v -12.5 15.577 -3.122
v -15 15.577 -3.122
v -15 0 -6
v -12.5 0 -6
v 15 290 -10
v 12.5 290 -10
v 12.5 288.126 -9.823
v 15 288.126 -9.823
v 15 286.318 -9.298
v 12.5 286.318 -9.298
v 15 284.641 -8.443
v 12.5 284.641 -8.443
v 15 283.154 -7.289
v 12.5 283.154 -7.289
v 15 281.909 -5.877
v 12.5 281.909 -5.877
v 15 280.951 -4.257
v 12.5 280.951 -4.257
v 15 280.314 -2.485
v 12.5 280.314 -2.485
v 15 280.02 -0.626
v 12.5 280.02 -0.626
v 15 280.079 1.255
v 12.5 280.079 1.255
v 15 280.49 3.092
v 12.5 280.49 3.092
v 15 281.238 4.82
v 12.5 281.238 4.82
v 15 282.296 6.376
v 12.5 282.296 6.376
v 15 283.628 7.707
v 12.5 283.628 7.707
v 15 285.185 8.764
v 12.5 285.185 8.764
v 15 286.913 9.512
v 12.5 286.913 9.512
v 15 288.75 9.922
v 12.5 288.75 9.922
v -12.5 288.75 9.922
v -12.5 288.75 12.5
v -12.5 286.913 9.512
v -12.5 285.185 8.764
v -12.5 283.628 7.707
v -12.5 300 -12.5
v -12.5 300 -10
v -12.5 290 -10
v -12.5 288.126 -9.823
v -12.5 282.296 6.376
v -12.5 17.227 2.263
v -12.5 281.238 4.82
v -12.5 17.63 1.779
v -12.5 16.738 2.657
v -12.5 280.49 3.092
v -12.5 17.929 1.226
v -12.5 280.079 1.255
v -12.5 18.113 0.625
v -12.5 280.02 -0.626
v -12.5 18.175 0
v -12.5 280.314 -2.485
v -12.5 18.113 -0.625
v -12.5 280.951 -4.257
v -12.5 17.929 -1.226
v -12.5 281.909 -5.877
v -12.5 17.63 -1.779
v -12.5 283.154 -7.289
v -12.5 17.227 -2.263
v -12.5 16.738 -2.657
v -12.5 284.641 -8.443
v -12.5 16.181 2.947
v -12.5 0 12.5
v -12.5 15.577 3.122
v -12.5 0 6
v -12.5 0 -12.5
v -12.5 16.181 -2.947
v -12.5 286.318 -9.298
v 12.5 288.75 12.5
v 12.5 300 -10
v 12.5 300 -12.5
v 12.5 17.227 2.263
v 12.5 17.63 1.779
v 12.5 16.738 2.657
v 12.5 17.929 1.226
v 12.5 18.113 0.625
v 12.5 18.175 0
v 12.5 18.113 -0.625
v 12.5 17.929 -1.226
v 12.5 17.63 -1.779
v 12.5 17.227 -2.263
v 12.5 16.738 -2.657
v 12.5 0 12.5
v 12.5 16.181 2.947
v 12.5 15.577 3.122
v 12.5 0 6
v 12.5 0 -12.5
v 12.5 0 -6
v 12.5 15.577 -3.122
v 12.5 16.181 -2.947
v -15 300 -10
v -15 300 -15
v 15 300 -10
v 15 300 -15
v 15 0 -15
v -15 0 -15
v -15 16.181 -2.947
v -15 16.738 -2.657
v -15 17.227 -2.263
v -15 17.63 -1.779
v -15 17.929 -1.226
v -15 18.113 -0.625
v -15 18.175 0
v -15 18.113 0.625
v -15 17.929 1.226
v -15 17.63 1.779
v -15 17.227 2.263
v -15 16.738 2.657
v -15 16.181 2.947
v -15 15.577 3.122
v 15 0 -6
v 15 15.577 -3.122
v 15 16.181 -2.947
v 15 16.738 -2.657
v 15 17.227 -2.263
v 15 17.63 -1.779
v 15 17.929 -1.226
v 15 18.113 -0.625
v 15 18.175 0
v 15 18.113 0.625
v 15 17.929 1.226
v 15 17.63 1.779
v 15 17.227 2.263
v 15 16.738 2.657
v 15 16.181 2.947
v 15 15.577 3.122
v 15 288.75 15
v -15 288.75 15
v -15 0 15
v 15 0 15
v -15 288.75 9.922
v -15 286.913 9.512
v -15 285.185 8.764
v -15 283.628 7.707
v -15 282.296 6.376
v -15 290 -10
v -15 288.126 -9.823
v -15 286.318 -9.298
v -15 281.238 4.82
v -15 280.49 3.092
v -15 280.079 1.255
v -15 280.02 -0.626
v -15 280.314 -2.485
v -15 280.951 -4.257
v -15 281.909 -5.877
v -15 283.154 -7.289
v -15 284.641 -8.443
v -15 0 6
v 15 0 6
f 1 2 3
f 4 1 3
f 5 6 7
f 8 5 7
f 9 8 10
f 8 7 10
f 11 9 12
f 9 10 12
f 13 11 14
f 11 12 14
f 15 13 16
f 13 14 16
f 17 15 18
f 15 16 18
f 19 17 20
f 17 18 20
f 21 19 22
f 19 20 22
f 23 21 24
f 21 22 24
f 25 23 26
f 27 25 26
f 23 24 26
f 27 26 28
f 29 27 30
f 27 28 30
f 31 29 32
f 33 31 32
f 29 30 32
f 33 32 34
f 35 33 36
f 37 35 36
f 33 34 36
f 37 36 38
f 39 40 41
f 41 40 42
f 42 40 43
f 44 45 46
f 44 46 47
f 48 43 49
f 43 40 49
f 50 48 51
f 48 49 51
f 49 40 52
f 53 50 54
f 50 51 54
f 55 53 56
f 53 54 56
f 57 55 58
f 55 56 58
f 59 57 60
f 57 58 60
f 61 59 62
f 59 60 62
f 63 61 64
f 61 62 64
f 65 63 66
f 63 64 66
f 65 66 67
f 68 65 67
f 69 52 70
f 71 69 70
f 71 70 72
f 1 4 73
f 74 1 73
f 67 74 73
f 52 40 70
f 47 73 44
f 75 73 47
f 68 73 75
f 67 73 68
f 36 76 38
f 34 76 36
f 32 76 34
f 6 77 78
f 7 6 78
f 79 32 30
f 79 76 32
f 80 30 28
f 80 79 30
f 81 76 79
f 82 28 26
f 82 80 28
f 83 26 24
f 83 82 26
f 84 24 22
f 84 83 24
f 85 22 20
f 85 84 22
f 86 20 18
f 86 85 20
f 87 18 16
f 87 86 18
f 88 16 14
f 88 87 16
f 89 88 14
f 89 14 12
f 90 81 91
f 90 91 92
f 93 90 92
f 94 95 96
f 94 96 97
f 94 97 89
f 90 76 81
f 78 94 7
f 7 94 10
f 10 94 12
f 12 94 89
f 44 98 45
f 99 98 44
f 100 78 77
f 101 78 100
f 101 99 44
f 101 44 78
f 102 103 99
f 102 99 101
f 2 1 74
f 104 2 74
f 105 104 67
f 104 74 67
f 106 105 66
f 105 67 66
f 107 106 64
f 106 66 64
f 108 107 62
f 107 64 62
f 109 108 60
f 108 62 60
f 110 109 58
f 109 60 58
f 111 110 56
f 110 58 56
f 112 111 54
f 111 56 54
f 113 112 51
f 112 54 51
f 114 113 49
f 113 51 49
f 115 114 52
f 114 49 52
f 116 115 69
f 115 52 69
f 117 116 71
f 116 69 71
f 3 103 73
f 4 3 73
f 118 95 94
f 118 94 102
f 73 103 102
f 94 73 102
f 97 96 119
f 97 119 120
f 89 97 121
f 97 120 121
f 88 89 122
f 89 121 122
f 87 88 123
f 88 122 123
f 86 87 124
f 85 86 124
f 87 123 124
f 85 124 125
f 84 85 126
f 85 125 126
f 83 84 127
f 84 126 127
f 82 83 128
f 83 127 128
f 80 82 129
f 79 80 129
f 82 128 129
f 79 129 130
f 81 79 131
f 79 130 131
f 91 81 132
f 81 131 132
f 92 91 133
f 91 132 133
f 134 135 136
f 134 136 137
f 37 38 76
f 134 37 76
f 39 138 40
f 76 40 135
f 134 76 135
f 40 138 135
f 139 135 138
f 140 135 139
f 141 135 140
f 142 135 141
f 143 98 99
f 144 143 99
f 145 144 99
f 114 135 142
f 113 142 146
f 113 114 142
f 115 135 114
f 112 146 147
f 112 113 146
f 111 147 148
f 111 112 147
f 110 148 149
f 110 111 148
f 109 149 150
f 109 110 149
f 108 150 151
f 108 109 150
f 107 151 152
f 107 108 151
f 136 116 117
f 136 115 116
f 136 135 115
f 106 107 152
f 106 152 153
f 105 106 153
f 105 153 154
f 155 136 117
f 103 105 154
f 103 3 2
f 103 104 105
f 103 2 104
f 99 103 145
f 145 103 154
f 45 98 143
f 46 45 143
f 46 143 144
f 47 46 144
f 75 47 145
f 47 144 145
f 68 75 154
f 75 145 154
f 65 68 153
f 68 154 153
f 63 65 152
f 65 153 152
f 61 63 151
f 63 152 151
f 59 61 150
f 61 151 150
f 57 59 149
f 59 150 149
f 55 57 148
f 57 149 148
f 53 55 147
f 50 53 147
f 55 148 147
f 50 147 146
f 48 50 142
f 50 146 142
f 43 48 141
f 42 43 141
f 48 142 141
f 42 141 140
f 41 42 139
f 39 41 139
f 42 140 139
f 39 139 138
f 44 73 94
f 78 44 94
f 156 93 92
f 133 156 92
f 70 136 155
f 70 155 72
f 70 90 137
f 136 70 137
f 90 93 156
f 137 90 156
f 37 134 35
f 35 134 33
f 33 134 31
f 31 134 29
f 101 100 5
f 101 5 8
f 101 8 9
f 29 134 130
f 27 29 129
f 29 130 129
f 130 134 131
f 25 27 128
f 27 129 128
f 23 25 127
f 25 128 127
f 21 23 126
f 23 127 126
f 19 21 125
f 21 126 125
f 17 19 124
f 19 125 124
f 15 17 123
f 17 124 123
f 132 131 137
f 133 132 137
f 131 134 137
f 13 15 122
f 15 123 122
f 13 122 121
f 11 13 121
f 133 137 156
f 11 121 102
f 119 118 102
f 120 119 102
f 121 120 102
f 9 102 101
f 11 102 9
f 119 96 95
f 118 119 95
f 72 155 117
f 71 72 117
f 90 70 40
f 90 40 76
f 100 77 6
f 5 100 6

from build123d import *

# Parameters (mm, degrees)
SKETCH1_W                   = 30
SKETCH1_H                   = 30
SKETCH1_W_2                 = 25
SKETCH1_H_2                 = 25
BOSS_EXTRUDE1_DEPTH         = 300
F_1_4_0_25_DIAMETER_HOLE1_D = 6.35
CUT_EXTRUDE1_DEPTH          = 302.869176962
CUT_EXTRUDE2_DEPTH          = 302.869176962


with BuildPart() as part:
    # Sketch1 → Boss-Extrude1 (new body)
    with BuildSketch(Plane(origin=(0, 0, 0), x_dir=(1, 0, 0), z_dir=(0, 1, 0))):
        Rectangle(SKETCH1_W, SKETCH1_H)
        Rectangle(SKETCH1_W_2, SKETCH1_H_2, mode=Mode.SUBTRACT)
    extrude(amount=BOSS_EXTRUDE1_DEPTH)

    # 1/4 (0.25) Diameter Hole1 (through all)
    with Locations(Plane.ZY.offset(15)):
        with Locations((0, 15)):
            Hole(F_1_4_0_25_DIAMETER_HOLE1_D / 2)

    # Sketch4 → Cut-Extrude1 (cut, through all)
    with BuildSketch(Plane.ZY.offset(15)):
        with BuildLine():
            Line((-10, 300), (-10, 290))
            ThreePointArc((-10, 290), (-0.626229125, 280.019627408), (9.921567416, 288.75))
            Line((9.921567416, 288.75), (15, 288.75))
            Line((15, 288.75), (15, 300))
            Line((15, 300), (-10, 300))
        make_face()
    extrude(amount=-CUT_EXTRUDE1_DEPTH, mode=Mode.SUBTRACT)

    # Sketch5 → Cut-Extrude2 (cut, through all)
    with BuildSketch(Plane.ZY.offset(15)):
        with BuildLine():
            Line((-3.122162674, 15.576823403), (-6, 0))
            Line((-6, 0), (6, 0))
            Line((6, 0), (3.122162674, 15.576823403))
            ThreePointArc((3.122162674, 15.576823403), (0, 18.175), (-3.122162674, 15.576823403))
        make_face()
    extrude(amount=-CUT_EXTRUDE2_DEPTH, mode=Mode.SUBTRACT)


solid = part.part
